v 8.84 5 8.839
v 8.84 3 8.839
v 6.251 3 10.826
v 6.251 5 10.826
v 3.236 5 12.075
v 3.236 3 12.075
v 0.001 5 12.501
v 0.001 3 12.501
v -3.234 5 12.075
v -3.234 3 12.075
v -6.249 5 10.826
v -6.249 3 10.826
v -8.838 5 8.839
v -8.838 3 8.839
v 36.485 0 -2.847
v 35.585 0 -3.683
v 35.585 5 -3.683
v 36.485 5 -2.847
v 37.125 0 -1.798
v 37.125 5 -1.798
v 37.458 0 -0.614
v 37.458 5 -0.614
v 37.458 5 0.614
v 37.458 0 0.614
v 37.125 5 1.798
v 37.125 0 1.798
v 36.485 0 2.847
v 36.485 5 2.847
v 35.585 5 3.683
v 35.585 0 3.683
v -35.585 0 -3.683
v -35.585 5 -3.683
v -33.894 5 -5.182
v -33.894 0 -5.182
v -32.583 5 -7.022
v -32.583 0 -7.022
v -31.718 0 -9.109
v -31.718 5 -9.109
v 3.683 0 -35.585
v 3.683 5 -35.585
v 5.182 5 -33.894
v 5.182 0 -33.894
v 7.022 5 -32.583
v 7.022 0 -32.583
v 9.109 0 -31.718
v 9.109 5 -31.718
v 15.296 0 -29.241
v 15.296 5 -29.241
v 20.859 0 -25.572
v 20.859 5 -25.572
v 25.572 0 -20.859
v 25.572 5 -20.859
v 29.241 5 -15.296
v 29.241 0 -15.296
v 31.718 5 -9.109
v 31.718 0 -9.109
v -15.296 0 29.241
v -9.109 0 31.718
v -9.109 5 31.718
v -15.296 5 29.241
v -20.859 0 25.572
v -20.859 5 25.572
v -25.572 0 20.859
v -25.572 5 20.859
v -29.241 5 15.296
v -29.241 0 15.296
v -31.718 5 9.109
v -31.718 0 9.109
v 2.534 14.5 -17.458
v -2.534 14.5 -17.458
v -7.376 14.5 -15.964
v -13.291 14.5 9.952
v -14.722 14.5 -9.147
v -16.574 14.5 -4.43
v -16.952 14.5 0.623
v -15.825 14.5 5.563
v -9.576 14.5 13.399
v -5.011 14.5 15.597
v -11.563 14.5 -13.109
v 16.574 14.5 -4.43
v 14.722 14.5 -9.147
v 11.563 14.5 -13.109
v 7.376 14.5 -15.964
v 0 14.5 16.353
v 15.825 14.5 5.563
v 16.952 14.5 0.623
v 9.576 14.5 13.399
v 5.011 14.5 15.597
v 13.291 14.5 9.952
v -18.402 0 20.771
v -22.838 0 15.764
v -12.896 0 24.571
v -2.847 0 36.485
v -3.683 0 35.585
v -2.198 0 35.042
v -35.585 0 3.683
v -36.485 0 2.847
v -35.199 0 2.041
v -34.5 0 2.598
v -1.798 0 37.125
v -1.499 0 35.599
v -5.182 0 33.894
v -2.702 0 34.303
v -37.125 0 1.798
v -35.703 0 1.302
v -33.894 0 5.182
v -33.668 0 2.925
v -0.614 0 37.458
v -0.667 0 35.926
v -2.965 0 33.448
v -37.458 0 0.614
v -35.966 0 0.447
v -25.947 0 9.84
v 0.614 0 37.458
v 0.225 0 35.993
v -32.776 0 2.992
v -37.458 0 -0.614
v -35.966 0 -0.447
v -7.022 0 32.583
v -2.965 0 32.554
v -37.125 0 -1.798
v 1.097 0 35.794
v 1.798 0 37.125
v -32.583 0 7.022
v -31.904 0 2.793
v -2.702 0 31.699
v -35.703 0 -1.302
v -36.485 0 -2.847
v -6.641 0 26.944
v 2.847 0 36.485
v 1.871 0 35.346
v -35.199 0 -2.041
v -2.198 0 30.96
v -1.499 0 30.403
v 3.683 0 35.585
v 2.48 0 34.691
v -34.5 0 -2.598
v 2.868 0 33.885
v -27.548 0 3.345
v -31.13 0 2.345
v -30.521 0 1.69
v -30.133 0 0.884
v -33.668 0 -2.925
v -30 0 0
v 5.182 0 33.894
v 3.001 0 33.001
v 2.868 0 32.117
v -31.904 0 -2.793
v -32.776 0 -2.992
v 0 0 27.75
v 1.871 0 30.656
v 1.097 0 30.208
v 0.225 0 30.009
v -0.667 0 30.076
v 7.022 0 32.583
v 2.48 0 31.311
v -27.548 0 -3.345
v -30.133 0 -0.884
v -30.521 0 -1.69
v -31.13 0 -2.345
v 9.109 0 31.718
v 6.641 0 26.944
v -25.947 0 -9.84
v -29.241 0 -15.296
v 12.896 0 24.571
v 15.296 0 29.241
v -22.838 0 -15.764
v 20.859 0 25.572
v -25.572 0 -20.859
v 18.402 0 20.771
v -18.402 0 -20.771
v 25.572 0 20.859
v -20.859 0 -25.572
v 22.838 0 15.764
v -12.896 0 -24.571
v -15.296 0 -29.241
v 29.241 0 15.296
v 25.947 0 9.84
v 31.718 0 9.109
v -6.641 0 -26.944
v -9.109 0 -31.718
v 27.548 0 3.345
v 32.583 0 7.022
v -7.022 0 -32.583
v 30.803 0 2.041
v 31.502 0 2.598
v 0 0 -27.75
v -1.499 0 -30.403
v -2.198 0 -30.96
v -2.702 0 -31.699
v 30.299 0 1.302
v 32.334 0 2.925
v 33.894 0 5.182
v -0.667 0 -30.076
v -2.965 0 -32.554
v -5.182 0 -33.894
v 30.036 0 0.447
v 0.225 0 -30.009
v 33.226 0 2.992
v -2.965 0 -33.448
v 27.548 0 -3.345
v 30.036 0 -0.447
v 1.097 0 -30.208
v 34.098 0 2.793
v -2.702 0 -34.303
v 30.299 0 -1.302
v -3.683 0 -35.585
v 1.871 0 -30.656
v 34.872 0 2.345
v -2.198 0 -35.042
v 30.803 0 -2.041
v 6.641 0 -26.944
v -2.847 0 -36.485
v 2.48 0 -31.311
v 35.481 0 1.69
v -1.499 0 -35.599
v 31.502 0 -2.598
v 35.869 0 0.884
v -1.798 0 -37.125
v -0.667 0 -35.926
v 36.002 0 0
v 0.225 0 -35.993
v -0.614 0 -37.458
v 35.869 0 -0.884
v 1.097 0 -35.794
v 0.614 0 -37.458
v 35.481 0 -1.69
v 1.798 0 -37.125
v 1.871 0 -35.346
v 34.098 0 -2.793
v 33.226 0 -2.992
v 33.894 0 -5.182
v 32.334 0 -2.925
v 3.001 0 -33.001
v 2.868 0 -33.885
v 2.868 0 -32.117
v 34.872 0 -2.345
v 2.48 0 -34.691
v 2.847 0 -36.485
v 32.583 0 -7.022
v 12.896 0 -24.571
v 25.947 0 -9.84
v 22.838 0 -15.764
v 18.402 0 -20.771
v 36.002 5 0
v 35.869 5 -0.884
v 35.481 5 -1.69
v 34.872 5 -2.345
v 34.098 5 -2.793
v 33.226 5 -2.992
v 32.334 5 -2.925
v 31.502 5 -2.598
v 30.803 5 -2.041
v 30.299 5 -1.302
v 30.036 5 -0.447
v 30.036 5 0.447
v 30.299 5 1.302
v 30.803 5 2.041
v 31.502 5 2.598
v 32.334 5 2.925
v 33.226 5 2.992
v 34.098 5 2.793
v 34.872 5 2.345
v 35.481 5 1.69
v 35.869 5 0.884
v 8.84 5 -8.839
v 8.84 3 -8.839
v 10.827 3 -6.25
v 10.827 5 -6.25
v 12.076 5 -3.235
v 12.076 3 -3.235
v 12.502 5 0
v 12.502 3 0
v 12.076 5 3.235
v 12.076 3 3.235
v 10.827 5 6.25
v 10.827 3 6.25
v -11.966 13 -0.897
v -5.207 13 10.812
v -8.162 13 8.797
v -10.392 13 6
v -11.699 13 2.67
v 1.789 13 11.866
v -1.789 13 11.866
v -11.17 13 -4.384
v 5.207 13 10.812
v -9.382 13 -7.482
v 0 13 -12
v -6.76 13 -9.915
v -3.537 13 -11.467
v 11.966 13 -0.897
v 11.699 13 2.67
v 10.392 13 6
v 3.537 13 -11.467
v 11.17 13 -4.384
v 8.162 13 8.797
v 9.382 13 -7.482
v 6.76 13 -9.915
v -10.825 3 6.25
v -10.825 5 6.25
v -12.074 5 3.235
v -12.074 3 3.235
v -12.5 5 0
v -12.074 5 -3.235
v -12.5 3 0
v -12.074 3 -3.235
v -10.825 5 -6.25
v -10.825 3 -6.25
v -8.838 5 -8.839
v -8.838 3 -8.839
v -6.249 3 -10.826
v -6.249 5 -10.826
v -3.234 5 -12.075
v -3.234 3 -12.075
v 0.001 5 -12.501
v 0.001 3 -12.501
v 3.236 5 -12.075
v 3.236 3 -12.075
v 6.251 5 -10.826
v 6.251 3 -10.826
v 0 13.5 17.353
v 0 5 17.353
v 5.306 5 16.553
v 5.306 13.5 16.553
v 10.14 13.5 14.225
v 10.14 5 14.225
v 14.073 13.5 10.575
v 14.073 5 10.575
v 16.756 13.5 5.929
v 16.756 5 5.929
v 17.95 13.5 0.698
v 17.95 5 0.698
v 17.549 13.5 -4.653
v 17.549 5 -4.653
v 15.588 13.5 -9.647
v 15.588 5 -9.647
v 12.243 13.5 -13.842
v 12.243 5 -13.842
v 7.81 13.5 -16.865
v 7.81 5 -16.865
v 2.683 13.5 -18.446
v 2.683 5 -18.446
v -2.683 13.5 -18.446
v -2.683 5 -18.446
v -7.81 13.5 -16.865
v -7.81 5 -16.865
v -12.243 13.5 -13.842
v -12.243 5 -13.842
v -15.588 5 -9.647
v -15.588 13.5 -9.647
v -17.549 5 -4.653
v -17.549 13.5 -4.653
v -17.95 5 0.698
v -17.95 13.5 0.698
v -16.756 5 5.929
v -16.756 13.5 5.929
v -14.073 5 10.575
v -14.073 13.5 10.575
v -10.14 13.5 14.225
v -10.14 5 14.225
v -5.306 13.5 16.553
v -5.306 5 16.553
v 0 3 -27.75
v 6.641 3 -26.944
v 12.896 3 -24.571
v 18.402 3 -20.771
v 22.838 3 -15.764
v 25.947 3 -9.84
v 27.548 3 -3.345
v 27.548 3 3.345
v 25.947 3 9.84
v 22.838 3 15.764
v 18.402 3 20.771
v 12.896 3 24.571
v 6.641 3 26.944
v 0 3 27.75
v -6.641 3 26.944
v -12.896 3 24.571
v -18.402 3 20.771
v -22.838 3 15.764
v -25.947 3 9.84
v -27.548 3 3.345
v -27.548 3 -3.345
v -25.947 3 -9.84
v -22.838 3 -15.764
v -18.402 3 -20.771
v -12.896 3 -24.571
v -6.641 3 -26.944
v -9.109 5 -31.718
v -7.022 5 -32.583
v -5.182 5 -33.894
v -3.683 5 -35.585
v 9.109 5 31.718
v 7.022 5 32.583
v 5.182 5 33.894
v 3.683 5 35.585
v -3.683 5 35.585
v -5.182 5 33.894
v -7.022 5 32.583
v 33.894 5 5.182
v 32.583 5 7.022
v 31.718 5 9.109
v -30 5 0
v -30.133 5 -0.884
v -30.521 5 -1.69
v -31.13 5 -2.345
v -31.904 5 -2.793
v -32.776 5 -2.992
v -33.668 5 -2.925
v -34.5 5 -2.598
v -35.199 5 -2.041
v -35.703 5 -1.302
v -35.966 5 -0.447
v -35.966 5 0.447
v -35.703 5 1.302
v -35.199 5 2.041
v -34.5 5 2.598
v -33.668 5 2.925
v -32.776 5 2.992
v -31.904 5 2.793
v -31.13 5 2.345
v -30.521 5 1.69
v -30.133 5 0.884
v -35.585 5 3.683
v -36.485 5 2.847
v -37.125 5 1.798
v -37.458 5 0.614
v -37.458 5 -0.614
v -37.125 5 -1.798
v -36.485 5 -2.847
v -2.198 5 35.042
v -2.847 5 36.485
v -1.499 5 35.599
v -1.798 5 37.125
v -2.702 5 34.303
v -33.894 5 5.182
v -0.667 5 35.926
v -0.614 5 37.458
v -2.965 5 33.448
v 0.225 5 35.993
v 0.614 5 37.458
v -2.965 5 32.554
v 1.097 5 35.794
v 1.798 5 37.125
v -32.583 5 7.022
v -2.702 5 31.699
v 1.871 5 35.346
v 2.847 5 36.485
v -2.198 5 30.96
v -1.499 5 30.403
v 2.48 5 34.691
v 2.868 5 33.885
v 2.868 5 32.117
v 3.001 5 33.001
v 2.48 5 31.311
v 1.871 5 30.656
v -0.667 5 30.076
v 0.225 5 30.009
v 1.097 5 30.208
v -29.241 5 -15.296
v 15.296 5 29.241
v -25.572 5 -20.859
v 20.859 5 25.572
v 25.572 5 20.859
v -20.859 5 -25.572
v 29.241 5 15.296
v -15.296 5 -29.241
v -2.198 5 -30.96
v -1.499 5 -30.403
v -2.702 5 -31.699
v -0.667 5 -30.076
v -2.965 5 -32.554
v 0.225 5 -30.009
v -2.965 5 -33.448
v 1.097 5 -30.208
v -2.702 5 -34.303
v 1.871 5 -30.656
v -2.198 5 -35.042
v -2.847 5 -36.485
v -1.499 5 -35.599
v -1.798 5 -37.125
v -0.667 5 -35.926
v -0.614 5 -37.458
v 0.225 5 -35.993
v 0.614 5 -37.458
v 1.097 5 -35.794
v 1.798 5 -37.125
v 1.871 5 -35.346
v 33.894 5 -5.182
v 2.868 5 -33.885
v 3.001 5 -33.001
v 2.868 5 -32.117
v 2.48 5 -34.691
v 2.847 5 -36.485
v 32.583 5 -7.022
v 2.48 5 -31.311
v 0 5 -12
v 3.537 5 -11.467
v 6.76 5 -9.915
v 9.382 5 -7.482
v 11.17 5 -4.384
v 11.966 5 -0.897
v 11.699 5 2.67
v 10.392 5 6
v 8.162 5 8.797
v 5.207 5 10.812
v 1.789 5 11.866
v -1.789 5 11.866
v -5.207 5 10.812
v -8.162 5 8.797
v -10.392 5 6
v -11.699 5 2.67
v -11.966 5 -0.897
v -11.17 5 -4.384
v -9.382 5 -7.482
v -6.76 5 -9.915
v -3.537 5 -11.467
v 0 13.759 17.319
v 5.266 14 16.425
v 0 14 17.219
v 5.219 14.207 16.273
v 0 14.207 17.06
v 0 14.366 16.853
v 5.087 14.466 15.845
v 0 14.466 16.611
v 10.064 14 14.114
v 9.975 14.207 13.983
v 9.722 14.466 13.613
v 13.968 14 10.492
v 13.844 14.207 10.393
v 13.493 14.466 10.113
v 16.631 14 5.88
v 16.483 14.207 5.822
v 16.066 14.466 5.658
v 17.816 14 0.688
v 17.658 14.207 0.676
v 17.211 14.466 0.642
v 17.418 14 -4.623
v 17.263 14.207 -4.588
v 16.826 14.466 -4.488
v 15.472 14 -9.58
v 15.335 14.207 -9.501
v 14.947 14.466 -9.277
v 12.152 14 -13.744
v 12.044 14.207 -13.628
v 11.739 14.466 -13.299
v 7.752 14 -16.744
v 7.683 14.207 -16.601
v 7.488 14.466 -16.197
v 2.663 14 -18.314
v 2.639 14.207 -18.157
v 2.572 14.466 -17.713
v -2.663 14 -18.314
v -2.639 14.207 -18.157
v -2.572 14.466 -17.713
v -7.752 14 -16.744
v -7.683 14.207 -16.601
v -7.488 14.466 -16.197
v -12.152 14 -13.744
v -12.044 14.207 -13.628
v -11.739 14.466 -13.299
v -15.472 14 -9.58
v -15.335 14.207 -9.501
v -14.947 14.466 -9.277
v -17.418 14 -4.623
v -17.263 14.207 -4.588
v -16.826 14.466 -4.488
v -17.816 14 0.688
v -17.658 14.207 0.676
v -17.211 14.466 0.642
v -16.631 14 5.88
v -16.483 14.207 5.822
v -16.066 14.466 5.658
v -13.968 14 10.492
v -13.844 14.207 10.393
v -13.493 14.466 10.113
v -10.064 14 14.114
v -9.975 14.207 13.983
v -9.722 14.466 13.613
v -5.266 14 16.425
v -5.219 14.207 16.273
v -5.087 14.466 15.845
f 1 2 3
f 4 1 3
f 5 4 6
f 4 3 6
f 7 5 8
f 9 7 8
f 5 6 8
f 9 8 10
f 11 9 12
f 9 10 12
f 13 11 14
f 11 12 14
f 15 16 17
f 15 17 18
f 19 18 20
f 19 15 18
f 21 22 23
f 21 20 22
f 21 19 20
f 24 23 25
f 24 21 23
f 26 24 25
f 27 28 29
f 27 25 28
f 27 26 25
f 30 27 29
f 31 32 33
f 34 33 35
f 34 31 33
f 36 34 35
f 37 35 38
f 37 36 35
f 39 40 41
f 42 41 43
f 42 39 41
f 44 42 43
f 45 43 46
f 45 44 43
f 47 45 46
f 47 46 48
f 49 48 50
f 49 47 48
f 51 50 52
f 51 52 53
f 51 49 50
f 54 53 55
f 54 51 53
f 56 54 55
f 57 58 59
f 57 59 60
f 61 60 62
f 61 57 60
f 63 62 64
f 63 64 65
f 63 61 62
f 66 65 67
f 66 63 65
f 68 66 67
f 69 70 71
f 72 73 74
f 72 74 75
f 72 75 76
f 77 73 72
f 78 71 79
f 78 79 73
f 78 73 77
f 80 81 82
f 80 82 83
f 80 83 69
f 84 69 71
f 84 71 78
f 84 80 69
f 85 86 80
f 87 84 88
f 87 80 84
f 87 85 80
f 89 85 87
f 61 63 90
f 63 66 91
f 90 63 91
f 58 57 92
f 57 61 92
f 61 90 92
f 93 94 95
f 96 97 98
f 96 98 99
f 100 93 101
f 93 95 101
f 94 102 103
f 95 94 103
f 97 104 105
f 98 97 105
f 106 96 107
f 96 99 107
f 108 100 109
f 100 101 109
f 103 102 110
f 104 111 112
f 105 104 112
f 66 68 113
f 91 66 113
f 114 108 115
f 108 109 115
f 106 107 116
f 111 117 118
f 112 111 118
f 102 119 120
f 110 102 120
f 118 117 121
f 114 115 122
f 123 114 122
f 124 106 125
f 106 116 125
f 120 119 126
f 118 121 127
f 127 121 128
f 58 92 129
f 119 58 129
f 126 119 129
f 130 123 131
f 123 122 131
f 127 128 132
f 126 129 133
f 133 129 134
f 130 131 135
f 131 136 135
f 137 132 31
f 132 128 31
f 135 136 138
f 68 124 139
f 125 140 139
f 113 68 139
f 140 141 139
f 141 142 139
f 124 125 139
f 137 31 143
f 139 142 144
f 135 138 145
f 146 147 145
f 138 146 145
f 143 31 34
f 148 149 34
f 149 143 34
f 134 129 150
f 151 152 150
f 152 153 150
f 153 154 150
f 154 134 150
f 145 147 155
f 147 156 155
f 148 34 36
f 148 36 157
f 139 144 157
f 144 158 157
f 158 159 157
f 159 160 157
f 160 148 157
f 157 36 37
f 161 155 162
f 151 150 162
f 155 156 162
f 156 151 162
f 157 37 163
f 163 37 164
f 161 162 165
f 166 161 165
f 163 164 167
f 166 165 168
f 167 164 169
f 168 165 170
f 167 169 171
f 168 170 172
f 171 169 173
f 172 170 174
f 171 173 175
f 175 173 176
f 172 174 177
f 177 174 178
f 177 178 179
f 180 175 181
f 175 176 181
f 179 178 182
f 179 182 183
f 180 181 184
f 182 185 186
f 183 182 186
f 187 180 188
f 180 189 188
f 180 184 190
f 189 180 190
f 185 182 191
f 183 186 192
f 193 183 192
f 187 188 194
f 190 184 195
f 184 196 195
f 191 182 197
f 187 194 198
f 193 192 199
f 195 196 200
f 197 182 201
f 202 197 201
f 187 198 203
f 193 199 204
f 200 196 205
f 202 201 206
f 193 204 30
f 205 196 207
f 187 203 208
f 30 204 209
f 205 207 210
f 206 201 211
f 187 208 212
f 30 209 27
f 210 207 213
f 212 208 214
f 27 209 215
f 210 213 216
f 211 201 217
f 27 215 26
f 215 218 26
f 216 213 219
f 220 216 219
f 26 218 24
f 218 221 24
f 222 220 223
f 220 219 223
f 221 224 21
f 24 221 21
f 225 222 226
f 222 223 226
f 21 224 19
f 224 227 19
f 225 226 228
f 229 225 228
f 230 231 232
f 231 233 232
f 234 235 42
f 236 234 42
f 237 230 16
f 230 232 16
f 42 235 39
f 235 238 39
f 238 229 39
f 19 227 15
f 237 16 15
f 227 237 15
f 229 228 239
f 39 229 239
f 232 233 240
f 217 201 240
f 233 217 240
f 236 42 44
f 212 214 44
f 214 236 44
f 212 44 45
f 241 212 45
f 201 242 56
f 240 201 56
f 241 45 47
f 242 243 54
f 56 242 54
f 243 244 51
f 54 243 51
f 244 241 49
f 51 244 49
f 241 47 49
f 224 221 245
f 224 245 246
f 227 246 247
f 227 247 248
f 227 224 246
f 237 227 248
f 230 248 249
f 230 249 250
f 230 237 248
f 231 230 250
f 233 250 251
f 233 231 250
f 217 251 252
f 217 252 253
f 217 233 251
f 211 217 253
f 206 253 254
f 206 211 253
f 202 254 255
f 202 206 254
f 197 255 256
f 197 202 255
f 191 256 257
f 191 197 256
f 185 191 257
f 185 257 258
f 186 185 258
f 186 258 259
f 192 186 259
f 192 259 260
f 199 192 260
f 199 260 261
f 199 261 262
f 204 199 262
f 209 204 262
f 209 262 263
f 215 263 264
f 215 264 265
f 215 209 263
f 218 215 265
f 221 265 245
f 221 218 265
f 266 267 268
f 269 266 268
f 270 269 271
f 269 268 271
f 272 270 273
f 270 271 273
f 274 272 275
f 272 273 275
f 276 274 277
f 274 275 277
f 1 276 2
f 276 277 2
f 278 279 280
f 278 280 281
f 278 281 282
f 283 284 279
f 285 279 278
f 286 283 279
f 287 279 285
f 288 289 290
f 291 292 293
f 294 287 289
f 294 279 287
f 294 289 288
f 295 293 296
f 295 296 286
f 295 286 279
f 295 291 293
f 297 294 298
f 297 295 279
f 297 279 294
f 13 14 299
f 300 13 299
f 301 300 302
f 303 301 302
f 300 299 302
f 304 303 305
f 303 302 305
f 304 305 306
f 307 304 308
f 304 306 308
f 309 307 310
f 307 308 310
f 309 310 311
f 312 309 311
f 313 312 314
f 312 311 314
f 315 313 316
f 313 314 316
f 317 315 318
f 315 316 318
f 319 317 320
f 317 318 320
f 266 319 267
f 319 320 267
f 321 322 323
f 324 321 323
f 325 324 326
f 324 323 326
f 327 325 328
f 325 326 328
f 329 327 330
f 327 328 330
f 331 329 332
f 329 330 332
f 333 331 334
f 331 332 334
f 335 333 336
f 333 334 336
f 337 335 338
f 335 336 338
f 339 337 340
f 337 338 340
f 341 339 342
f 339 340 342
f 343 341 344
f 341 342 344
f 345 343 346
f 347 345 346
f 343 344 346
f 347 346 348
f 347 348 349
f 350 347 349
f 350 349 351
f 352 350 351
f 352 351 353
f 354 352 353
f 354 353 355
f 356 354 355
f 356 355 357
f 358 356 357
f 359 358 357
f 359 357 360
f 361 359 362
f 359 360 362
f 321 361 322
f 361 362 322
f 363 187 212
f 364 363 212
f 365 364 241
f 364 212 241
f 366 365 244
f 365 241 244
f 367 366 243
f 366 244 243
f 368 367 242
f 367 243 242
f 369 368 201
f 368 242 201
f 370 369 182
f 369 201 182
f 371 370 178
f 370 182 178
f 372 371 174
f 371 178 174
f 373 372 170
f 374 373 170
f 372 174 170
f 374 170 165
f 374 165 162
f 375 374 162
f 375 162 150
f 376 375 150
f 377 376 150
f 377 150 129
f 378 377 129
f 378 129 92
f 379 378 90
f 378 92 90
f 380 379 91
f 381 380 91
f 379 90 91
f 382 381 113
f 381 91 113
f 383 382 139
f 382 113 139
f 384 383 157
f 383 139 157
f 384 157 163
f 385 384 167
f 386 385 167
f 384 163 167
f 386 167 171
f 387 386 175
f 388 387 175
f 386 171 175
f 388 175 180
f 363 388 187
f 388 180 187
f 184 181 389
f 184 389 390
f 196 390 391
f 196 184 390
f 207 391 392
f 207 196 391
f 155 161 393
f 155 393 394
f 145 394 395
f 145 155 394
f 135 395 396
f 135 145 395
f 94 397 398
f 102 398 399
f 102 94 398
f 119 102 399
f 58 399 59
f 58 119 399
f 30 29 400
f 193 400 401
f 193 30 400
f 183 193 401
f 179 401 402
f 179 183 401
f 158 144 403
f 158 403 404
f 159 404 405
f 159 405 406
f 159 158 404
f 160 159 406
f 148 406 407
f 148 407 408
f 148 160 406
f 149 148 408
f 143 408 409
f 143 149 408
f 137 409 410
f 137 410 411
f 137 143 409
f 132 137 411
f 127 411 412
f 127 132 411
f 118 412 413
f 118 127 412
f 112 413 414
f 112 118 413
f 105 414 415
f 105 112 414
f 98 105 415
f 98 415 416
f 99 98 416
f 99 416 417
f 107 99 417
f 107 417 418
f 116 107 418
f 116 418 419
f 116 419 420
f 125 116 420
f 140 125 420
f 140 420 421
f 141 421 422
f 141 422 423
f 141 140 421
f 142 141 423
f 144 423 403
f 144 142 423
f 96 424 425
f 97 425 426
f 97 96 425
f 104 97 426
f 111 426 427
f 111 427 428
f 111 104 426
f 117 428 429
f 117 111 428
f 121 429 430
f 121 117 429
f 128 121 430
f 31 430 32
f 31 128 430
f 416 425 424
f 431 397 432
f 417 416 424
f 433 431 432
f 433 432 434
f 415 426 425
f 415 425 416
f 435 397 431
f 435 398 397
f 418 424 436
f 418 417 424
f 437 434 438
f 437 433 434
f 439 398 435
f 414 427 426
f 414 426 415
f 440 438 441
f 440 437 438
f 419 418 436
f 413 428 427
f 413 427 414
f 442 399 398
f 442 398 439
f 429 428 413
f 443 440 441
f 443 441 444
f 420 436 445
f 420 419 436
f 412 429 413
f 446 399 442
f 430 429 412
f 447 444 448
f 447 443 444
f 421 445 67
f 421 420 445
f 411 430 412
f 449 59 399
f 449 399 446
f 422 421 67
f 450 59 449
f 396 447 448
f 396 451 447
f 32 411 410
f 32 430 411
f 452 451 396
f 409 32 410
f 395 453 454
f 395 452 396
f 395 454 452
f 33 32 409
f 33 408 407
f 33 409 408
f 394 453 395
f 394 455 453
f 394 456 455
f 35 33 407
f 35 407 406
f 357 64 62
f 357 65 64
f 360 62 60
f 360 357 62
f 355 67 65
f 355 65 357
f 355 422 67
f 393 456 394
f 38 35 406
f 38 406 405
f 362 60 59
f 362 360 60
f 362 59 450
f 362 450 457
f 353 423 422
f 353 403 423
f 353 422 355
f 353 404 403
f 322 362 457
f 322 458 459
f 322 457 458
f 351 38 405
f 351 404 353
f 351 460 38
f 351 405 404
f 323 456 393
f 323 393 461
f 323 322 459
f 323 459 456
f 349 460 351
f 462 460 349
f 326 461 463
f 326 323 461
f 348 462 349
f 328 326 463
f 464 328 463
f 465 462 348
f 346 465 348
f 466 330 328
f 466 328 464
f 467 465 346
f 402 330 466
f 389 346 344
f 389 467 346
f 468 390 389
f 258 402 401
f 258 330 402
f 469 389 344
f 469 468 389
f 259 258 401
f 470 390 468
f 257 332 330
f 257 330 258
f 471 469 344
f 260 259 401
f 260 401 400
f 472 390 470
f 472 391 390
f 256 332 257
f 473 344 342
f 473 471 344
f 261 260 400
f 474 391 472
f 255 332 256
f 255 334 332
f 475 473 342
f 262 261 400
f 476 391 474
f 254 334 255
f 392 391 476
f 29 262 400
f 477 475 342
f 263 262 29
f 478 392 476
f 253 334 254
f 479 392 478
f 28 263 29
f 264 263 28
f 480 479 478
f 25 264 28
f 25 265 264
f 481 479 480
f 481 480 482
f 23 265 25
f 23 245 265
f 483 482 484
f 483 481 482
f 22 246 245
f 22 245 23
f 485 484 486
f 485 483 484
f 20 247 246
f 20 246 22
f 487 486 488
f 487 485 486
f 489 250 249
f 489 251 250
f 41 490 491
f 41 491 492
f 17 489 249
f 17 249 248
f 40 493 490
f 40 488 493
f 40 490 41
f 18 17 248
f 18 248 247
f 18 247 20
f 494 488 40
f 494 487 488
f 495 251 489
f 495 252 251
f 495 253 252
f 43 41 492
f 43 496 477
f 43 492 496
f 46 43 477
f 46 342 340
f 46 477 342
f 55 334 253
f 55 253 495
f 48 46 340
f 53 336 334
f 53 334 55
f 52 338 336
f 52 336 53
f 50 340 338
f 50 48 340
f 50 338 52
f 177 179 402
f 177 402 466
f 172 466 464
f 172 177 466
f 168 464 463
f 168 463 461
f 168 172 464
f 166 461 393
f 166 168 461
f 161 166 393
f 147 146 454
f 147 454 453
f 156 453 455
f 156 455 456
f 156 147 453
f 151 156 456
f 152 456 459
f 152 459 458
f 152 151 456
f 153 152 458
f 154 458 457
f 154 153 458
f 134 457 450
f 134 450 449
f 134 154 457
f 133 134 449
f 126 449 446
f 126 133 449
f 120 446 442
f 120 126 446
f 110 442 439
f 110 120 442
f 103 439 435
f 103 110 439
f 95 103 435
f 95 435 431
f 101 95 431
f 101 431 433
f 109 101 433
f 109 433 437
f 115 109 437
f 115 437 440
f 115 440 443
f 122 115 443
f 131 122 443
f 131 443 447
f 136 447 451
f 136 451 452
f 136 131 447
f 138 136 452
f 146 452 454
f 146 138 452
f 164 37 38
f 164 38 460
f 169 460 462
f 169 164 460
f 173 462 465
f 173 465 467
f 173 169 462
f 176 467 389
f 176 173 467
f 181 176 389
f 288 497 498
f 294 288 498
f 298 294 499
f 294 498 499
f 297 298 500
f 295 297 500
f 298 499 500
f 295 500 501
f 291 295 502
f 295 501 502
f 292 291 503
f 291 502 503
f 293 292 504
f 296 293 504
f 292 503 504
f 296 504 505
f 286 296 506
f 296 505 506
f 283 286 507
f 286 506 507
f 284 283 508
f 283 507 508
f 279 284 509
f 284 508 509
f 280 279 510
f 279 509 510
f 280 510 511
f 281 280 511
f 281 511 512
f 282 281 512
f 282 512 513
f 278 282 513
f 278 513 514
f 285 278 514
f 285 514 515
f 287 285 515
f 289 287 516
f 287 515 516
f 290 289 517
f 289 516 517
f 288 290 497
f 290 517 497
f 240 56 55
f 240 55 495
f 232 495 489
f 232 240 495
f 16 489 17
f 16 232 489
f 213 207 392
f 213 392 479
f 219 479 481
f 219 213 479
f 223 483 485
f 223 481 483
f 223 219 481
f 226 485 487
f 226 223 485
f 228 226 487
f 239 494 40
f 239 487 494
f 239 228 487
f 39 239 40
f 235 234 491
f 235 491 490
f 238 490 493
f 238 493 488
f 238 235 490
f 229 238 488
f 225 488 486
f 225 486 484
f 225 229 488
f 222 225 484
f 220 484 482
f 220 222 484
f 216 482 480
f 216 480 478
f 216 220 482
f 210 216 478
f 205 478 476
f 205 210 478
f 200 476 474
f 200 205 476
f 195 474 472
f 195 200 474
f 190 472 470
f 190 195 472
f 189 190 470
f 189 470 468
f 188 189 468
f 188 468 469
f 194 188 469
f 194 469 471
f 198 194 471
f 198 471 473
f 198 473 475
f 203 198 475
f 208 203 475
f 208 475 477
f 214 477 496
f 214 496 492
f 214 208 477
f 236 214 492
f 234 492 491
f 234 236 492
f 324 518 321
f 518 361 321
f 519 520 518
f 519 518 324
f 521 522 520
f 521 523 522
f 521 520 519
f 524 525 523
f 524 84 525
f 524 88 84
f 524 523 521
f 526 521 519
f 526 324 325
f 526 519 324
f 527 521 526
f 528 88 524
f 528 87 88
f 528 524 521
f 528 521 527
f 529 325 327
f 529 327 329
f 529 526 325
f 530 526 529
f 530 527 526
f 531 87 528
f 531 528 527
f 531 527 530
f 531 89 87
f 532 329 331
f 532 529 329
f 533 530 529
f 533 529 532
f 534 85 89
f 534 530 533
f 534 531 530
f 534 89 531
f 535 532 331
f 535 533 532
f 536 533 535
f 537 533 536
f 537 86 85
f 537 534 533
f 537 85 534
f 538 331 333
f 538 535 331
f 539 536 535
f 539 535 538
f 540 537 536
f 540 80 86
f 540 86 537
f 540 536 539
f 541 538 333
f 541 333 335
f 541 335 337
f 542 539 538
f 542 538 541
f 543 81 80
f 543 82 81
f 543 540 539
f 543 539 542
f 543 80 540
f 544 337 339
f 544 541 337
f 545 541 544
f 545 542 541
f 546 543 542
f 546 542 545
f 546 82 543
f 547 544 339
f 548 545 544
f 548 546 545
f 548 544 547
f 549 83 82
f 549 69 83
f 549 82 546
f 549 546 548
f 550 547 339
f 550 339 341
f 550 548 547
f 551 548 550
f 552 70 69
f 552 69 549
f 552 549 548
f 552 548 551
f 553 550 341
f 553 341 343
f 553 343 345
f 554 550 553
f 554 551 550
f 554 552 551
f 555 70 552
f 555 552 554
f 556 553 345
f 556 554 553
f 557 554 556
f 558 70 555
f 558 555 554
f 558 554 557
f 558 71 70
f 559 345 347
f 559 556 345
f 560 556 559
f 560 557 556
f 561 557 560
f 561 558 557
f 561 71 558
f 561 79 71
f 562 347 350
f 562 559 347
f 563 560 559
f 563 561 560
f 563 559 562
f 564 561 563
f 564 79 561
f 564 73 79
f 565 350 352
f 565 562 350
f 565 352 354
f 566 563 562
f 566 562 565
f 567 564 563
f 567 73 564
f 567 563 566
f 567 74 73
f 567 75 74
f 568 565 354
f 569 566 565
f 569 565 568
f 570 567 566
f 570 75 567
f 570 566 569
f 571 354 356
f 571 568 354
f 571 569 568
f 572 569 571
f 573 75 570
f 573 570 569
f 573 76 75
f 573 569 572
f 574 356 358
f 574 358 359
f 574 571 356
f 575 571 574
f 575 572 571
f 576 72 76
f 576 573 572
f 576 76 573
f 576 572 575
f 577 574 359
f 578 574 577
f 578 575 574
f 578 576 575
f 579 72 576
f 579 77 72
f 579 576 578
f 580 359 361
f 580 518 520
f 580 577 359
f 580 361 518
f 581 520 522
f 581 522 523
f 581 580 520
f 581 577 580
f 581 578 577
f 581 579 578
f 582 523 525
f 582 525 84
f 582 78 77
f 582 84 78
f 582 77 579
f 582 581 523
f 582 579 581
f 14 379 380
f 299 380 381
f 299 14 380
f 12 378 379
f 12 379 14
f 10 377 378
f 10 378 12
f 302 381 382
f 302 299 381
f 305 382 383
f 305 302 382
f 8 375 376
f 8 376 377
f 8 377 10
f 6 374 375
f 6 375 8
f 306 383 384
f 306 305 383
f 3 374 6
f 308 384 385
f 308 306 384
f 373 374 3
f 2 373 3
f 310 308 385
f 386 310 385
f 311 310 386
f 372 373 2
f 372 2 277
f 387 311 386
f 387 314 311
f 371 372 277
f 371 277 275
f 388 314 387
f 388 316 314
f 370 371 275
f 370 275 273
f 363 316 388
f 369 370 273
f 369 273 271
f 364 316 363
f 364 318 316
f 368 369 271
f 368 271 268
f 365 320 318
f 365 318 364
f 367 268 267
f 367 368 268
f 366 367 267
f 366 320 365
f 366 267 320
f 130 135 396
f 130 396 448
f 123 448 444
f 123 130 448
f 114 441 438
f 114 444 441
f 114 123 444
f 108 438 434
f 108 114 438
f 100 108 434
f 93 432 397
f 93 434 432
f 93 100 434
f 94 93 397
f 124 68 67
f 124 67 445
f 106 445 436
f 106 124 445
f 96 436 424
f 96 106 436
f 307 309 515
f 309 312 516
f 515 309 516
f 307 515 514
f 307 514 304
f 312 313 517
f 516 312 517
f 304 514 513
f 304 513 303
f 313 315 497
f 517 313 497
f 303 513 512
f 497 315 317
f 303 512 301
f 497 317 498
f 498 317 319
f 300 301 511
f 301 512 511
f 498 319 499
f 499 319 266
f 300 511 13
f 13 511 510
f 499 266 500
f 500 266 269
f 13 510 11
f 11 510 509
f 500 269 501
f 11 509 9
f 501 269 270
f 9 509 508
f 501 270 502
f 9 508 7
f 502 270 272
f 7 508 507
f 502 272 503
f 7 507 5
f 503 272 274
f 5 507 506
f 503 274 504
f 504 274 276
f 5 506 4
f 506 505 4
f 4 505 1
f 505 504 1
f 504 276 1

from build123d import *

# Parameters (mm, degrees)
BOSS_EXTRUDE1_OUTLINE_W = 75
BOSS_EXTRUDE1_OUTLINE_H = 75
BOSS_EXTRUDE1_OUTLINE_R = 3
BOSS_EXTRUDE1_DEPTH     = 5
SKETCH2_R               = 27.75
CUT_EXTRUDE1_DEPTH      = 3
SKETCH3_OUTSIDE_W       = 98.236
SKETCH3_OUTSIDE_H       = 98.236
CUT_EXTRUDE5_DEPTH      = 5
SKETCH4_R               = 18
BOSS_EXTRUDE2_DEPTH     = 9.5
SKETCH5_R               = 12
CUT_EXTRUDE6_DEPTH      = 8
FILLET1_R               = 1


# Read off the part's stored shape, not the designer's step: Boss-Extrude1
with BuildPart() as part:
    # Boss-Extrude1 outline → Boss-Extrude1 (new body)
    with BuildSketch(Plane(origin=(0, 0, 0), x_dir=(1, 0, 0), z_dir=(0, 1, 0))):
        Rectangle(BOSS_EXTRUDE1_OUTLINE_W, BOSS_EXTRUDE1_OUTLINE_H)
        with Locations((0.001, -33.001)):
            Circle(BOSS_EXTRUDE1_OUTLINE_R, mode=Mode.SUBTRACT)
        with Locations((-33, 0)):
            Circle(BOSS_EXTRUDE1_OUTLINE_R, mode=Mode.SUBTRACT)
        with BuildLine():
            ThreePointArc((8.840334751, 8.839334751), (12.502, 0), (8.840334751, -8.839334751))
            ThreePointArc((8.840334751, -8.839334751), (0.001, -12.501), (-8.838334751, -8.839334751))
            ThreePointArc((-8.838334751, -8.839334751), (-12.5, 0), (-8.838334751, 8.839334751))
            ThreePointArc((-8.838334751, 8.839334751), (0.001, 12.501), (8.840334751, 8.839334751))
        make_face(mode=Mode.SUBTRACT)
        with Locations((33.002, 0)):
            Circle(BOSS_EXTRUDE1_OUTLINE_R, mode=Mode.SUBTRACT)
        with Locations((0.001, 33.001)):
            Circle(BOSS_EXTRUDE1_OUTLINE_R, mode=Mode.SUBTRACT)
    extrude(amount=BOSS_EXTRUDE1_DEPTH)

    # Sketch2 → Cut-Extrude1 (cut)
    with BuildSketch(Plane.XZ):
        with Locations(Location((0, 0, 0), (0, 0, 270))):
            Circle(SKETCH2_R)
    extrude(amount=-CUT_EXTRUDE1_DEPTH, mode=Mode.SUBTRACT)

    # Sketch3 outside → Cut-Extrude5 (cut)
    with BuildSketch(Plane.XZ):
        Rectangle(SKETCH3_OUTSIDE_W, SKETCH3_OUTSIDE_H)
        with BuildLine():
            ThreePointArc((-31.718023256, -9.10862233), (-23.334523779, -23.334523779), (-9.10862233, -31.718023256))
            ThreePointArc((-9.10862233, -31.718023256), (-6.064515675, -33.186440594), (-3.683424077, -35.585031348))
            ThreePointArc((-3.683424077, -35.585031348), (0, -37.5), (3.683424077, -35.585031348))
            ThreePointArc((3.683424077, -35.585031348), (6.064515675, -33.186440594), (9.10862233, -31.718023256))
            ThreePointArc((9.10862233, -31.718023256), (23.334523779, -23.334523779), (31.718023256, -9.10862233))
            ThreePointArc((31.718023256, -9.10862233), (33.186440594, -6.064515675), (35.585031348, -3.683424077))
            ThreePointArc((35.585031348, -3.683424077), (37.5, 0), (35.585031348, 3.683424077))
            ThreePointArc((35.585031348, 3.683424077), (33.186440594, 6.064515675), (31.718023256, 9.10862233))
            ThreePointArc((31.718023256, 9.10862233), (23.334523779, 23.334523779), (9.10862233, 31.718023256))
            ThreePointArc((9.10862233, 31.718023256), (6.064515675, 33.186440594), (3.683424077, 35.585031348))
            ThreePointArc((3.683424077, 35.585031348), (0, 37.5), (-3.683424077, 35.585031348))
            ThreePointArc((-3.683424077, 35.585031348), (-6.064515675, 33.186440594), (-9.10862233, 31.718023256))
            ThreePointArc((-9.10862233, 31.718023256), (-23.334523779, 23.334523779), (-31.718023256, 9.10862233))
            ThreePointArc((-31.718023256, 9.10862233), (-33.186440594, 6.064515675), (-35.585031348, 3.683424077))
            ThreePointArc((-35.585031348, 3.683424077), (-37.5, 0), (-35.585031348, -3.683424077))
            ThreePointArc((-35.585031348, -3.683424077), (-33.186440594, -6.064515675), (-31.718023256, -9.10862233))
        make_face(mode=Mode.SUBTRACT)
    extrude(amount=-CUT_EXTRUDE5_DEPTH, mode=Mode.SUBTRACT)

    # Sketch4 → Boss-Extrude2 (add)
    with BuildSketch(Plane(origin=(0, 5, 0), x_dir=(1, 0, 0), z_dir=(0, 1, 0))):
        with Locations(Location((0, 0.647401089, 0), (0, 0, 270))):
            Circle(SKETCH4_R)
    extrude(amount=BOSS_EXTRUDE2_DEPTH)

    # Sketch5 → Cut-Extrude6 (cut)
    with BuildSketch(Plane.XZ.offset(-5)):
        with Locations(Location((0, 0, 0), (0, 0, 270))):
            Circle(SKETCH5_R)
    extrude(amount=-CUT_EXTRUDE6_DEPTH, mode=Mode.SUBTRACT)

    # Fillet1
    fillet1_edges = [part.edges().sort_by_distance(p)[0] for p in [
        (0, 14.5, -18.647401089),
    ]]
    fillet(fillet1_edges, radius=FILLET1_R)


solid = part.part
